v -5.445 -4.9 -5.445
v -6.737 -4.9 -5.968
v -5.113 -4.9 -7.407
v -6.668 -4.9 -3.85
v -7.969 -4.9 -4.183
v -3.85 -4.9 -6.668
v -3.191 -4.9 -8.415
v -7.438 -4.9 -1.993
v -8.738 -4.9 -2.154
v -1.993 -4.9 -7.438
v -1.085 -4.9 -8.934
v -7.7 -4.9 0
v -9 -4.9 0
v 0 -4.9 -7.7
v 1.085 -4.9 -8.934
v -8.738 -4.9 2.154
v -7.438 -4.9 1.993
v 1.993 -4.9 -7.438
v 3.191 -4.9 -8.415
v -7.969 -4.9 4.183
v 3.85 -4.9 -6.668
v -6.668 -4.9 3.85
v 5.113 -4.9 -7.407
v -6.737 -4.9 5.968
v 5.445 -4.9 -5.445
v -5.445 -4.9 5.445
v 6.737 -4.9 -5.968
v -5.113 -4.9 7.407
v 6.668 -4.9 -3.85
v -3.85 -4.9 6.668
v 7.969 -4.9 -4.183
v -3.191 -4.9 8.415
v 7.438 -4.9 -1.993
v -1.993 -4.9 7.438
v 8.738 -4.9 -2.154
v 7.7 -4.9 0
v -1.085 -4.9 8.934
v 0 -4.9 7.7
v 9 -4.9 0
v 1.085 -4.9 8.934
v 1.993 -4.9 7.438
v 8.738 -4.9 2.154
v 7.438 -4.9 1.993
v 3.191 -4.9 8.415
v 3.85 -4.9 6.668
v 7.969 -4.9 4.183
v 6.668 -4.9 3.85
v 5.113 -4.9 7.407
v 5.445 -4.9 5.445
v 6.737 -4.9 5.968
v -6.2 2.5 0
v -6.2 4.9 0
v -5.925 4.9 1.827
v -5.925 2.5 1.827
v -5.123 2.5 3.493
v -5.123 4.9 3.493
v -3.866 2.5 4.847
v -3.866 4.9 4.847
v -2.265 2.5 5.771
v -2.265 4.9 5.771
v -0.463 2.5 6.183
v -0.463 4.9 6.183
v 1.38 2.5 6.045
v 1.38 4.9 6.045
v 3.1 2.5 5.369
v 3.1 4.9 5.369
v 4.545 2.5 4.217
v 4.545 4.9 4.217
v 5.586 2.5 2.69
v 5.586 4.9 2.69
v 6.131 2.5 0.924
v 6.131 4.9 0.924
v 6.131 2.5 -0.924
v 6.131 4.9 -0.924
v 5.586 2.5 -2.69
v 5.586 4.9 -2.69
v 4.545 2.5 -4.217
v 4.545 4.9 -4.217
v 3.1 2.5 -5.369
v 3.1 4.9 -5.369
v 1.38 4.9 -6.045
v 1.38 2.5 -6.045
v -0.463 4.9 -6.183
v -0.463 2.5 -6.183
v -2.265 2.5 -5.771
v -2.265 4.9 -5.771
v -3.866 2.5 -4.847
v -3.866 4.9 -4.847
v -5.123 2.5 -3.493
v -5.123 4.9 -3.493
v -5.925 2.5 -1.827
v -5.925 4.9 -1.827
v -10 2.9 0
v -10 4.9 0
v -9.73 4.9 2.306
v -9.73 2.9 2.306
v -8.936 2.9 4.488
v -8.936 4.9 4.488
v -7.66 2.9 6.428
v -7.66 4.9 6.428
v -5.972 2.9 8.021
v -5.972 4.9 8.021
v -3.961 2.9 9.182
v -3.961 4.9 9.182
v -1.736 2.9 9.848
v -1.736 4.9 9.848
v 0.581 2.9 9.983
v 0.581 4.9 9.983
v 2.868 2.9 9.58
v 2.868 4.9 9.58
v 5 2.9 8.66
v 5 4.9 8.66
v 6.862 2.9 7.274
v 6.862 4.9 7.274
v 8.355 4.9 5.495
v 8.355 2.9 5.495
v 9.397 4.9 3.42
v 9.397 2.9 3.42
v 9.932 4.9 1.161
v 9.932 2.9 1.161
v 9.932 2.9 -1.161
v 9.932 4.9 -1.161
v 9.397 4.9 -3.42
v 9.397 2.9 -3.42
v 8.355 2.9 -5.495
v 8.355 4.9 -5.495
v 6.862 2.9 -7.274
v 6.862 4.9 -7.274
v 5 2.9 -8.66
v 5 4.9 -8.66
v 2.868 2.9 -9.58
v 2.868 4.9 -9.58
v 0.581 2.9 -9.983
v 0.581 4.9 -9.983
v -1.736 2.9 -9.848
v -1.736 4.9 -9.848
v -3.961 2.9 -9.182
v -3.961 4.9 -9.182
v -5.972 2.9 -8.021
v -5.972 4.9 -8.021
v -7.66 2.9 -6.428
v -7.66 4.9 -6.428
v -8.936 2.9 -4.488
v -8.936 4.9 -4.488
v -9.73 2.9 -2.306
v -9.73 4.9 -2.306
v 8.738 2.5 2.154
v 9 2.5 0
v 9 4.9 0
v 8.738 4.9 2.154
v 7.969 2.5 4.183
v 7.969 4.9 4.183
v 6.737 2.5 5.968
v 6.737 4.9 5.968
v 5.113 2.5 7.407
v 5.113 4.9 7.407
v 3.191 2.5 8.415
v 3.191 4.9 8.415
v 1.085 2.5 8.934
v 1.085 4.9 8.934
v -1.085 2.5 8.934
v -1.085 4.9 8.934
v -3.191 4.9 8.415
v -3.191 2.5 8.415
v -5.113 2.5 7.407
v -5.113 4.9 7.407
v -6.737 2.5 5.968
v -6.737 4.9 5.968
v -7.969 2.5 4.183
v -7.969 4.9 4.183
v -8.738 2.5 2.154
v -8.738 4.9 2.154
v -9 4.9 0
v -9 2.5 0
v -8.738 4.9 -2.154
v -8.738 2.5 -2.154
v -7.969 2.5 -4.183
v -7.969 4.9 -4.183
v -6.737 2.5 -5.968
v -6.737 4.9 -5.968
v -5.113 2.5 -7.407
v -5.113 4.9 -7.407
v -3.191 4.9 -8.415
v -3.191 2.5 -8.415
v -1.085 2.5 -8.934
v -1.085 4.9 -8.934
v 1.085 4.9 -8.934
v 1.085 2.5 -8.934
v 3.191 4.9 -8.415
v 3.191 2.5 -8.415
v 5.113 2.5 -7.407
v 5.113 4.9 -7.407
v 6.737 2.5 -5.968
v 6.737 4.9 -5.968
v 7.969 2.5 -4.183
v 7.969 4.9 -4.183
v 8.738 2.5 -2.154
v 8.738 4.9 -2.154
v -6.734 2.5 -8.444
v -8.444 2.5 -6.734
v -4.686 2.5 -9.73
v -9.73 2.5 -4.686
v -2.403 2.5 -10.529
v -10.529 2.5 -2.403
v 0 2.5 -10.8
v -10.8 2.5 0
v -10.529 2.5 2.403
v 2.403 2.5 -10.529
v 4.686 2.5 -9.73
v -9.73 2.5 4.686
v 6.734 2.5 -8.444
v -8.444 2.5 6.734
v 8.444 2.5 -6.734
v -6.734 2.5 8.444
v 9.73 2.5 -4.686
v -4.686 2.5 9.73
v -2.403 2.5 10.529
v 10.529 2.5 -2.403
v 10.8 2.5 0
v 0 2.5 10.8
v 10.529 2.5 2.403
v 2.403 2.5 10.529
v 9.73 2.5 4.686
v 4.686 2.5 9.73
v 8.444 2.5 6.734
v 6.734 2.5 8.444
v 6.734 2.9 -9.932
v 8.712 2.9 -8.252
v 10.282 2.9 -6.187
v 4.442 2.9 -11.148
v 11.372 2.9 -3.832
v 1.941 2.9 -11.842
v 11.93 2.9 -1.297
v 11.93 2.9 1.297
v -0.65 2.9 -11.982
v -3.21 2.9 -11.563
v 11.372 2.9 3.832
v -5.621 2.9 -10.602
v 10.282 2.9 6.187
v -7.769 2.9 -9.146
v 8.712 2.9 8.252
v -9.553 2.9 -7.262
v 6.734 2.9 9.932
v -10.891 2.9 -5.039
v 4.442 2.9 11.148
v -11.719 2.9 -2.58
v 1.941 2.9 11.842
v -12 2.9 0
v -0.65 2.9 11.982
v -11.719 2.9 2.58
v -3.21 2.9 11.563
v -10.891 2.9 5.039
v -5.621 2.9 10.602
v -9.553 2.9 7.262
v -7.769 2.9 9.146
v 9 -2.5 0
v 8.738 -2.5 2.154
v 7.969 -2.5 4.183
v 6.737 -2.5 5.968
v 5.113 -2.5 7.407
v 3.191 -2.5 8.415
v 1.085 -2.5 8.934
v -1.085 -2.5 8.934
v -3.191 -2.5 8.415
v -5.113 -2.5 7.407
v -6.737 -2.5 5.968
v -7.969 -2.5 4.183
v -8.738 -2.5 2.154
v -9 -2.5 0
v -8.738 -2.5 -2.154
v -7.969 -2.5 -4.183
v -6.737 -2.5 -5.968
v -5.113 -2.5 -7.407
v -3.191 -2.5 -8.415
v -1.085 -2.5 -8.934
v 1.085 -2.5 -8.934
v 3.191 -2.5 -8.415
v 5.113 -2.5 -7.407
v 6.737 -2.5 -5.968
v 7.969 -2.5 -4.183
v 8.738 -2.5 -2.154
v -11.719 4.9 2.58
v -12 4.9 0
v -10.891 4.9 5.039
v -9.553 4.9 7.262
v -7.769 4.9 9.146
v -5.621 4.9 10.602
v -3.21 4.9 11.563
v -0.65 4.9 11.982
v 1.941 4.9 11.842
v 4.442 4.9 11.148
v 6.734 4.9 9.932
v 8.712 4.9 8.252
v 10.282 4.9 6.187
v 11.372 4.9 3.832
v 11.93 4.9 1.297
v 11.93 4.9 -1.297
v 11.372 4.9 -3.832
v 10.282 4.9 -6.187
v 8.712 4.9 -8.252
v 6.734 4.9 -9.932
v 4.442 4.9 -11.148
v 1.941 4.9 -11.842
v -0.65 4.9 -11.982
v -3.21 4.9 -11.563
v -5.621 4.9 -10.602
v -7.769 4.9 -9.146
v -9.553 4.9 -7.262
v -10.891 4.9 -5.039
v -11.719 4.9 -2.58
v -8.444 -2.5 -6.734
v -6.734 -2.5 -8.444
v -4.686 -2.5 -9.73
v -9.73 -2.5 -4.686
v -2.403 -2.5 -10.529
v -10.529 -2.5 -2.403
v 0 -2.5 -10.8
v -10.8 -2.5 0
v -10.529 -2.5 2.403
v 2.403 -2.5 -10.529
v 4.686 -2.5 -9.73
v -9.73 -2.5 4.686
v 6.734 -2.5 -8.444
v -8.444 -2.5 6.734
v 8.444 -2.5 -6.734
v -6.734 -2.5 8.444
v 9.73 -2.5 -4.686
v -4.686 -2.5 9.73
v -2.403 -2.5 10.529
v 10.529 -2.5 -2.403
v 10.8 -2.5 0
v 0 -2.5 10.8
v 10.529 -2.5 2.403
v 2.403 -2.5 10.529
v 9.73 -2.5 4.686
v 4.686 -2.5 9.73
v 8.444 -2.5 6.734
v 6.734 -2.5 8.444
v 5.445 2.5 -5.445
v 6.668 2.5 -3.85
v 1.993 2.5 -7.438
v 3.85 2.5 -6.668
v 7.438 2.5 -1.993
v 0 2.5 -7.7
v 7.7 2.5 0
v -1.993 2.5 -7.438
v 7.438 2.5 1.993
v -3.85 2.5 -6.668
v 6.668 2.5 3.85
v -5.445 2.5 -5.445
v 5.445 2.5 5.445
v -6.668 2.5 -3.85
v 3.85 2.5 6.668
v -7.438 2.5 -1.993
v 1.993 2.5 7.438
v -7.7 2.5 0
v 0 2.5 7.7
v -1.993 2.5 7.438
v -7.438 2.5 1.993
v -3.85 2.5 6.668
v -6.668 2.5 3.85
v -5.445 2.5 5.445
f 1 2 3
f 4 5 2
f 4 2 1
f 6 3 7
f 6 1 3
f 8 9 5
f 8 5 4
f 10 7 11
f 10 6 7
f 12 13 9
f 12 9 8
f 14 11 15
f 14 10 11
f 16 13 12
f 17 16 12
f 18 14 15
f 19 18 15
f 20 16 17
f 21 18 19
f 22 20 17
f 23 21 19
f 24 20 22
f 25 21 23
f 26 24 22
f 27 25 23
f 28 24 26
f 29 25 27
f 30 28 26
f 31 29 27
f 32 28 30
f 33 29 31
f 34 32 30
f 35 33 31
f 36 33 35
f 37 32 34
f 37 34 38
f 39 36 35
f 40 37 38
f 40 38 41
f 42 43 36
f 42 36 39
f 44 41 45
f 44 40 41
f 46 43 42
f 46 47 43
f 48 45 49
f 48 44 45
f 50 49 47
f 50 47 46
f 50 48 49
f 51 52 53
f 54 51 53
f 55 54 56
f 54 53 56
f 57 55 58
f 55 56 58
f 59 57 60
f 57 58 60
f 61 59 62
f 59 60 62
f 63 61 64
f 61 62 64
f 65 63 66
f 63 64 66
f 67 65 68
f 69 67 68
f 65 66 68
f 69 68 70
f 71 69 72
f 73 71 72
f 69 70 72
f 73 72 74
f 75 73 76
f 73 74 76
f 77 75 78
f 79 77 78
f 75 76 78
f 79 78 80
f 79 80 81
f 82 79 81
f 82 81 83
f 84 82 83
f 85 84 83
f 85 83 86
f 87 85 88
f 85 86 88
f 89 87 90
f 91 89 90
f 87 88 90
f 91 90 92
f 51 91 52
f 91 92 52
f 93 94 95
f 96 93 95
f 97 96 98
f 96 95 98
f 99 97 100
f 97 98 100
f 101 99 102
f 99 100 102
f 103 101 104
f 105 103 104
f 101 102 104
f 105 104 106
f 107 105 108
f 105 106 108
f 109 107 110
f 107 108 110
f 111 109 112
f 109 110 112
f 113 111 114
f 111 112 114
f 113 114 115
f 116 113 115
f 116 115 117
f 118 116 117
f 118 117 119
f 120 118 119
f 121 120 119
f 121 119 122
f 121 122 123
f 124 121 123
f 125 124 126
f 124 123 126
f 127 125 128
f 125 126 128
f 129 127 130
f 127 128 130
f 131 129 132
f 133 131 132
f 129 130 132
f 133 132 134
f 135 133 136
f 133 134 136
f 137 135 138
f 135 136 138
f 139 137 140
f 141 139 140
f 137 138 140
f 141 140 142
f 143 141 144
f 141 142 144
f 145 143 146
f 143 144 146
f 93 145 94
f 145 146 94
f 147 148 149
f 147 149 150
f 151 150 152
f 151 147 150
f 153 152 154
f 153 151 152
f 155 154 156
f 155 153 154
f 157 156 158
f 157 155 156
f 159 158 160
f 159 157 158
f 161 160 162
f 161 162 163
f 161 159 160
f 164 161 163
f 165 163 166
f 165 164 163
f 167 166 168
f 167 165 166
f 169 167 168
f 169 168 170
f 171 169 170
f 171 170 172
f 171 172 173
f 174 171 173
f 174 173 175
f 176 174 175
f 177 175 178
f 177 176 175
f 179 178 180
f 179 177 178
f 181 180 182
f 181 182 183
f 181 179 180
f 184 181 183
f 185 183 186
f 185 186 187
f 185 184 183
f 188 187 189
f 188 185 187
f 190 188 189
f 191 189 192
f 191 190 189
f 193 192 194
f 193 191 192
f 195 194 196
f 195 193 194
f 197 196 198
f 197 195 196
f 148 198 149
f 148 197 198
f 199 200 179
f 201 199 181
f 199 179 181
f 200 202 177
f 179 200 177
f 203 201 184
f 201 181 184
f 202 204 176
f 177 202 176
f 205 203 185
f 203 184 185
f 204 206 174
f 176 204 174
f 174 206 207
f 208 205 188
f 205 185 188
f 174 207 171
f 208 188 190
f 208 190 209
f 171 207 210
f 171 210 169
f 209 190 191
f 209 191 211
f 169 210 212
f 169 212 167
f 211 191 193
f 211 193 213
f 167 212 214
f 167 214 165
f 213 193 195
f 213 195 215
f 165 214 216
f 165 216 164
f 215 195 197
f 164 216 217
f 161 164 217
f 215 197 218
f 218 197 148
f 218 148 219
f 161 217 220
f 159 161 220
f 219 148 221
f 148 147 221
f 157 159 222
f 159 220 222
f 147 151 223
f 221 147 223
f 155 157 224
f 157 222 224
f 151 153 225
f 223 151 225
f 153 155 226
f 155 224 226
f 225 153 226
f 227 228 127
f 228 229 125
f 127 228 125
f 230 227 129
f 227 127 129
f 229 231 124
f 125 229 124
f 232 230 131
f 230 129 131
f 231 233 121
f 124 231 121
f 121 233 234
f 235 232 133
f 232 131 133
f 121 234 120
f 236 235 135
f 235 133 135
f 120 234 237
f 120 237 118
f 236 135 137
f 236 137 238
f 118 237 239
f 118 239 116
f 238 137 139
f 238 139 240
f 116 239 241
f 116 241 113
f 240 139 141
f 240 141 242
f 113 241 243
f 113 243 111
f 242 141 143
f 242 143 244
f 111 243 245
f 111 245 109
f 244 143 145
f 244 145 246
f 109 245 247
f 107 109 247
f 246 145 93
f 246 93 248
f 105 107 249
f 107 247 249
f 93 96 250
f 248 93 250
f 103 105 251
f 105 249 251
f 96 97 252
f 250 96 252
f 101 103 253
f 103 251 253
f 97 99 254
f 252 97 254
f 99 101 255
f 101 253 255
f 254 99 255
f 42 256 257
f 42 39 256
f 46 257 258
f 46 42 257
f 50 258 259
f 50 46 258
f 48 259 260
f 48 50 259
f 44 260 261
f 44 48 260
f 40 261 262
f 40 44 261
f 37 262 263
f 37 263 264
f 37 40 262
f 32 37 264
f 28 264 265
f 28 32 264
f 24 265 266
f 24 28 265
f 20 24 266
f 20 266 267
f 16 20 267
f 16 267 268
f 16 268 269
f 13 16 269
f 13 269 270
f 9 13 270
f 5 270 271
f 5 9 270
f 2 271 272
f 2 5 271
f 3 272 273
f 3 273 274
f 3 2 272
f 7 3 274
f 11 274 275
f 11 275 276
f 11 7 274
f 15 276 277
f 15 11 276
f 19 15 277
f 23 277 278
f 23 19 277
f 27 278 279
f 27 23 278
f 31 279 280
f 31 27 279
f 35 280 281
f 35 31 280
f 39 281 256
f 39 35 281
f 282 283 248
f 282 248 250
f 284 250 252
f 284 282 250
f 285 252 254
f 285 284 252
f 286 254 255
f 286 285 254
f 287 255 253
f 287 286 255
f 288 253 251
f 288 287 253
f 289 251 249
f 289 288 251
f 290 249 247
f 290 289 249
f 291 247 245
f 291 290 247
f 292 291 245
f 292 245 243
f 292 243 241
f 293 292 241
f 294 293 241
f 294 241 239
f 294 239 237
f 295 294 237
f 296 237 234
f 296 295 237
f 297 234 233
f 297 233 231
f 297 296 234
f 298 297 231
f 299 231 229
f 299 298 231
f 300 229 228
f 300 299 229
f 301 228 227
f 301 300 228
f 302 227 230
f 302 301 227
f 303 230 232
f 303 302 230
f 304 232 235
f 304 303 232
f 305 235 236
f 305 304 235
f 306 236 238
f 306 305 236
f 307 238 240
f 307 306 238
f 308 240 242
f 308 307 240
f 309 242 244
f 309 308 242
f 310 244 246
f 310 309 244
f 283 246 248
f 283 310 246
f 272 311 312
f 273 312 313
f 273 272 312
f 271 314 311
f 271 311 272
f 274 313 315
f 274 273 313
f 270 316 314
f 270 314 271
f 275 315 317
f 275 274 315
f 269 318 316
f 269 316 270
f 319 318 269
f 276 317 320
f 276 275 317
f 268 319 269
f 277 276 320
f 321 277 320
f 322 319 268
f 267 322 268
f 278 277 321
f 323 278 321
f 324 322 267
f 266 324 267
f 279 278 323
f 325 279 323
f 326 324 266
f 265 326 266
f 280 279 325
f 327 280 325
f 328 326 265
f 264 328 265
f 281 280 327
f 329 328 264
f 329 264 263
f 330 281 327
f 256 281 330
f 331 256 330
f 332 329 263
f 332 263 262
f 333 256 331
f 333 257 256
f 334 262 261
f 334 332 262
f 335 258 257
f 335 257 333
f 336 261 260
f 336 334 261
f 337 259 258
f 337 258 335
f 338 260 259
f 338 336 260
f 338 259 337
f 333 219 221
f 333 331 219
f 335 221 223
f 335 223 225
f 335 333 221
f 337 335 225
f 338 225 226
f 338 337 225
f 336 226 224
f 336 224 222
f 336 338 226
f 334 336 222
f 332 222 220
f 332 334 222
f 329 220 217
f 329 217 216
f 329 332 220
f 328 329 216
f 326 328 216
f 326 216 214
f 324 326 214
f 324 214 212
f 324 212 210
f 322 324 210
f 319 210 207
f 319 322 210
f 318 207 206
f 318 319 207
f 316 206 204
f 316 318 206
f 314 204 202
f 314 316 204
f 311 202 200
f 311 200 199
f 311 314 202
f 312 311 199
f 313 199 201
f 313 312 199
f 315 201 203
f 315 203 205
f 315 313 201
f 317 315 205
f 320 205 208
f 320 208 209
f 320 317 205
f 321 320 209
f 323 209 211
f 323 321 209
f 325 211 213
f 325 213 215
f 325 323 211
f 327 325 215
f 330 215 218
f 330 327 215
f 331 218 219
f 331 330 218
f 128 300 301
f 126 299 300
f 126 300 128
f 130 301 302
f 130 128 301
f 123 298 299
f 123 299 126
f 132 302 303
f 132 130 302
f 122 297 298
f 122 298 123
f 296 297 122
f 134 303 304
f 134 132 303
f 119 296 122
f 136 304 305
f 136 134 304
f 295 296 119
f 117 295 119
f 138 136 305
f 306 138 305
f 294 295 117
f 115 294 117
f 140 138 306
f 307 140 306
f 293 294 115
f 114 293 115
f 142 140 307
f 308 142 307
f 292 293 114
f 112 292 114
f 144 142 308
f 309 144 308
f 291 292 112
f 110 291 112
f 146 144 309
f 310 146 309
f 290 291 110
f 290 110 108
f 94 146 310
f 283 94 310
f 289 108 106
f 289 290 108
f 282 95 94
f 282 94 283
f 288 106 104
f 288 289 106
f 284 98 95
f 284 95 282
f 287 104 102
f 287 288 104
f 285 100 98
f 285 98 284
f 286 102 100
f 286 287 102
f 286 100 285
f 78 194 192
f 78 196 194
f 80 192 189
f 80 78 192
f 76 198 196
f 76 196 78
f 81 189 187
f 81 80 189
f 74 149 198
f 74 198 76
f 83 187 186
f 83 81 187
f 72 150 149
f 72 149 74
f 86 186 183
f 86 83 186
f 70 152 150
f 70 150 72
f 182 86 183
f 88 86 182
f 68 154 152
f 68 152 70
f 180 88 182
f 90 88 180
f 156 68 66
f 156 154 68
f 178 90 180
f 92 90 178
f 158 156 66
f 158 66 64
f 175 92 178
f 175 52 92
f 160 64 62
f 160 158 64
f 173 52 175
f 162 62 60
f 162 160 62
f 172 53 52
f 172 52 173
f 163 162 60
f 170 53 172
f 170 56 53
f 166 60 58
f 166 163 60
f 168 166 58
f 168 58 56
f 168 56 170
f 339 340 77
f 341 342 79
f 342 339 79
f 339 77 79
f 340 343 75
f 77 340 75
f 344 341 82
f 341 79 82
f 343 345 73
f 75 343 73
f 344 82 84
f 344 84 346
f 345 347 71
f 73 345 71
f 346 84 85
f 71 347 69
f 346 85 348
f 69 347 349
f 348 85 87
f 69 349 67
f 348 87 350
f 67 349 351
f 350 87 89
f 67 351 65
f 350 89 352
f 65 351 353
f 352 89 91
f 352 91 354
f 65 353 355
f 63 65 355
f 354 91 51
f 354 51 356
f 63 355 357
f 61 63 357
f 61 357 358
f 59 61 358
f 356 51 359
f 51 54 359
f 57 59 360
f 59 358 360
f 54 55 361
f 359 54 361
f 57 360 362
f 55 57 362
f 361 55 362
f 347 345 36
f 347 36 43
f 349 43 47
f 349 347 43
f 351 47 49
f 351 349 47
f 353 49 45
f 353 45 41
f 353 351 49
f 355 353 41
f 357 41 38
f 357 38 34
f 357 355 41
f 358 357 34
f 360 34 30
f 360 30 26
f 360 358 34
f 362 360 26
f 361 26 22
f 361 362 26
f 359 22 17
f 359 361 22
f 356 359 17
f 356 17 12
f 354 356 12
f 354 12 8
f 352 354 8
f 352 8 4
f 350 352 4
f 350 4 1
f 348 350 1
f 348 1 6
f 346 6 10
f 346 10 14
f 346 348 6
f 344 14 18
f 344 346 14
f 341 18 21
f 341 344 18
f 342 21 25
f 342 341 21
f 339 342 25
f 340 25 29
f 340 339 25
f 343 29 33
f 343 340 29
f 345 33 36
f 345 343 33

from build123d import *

# Parameters (mm, degrees)
F0_R     = 10.8
F0_R_2   = 9
F1_DEPTH = 2.5
F0_R_3   = 7.7
F2_DEPTH = 4.9
F3_R     = 7.7
F3_R_2   = 6.2
F4_DEPTH = 2.4
F5_R     = 12
F5_R_2   = 10
F6_DEPTH = 2


with BuildPart() as f1:
    # F0 (on Front) → F1 (new body, symmetric)
    with BuildSketch(Plane.XZ):
        Circle(F0_R)
        Circle(F0_R_2, mode=Mode.SUBTRACT)
    extrude(amount=F1_DEPTH, both=True)

    # F0 (on Front) → F2 (join, symmetric)
    with BuildSketch(Plane.XZ):
        Circle(F0_R_2)
        Circle(F0_R_3, mode=Mode.SUBTRACT)
    extrude(amount=F2_DEPTH, both=True)

    # F3 (on face) → F4 (join)
    with BuildSketch(Plane(origin=(0, 4.9, 0), x_dir=(-1, 0, 0), z_dir=(0, 1, 0))):
        Circle(F3_R)
        Circle(F3_R_2, mode=Mode.SUBTRACT)
    extrude(amount=-F4_DEPTH)


with BuildPart() as f6:
    # F5 (on face) → F6 (new body)
    with BuildSketch(Plane(origin=(0, 4.9, 0), x_dir=(-1, 0, 0), z_dir=(0, 1, 0))):
        Circle(F5_R)
        Circle(F5_R_2, mode=Mode.SUBTRACT)
    extrude(amount=-F6_DEPTH)


solid = Compound([f1.part, f6.part])
